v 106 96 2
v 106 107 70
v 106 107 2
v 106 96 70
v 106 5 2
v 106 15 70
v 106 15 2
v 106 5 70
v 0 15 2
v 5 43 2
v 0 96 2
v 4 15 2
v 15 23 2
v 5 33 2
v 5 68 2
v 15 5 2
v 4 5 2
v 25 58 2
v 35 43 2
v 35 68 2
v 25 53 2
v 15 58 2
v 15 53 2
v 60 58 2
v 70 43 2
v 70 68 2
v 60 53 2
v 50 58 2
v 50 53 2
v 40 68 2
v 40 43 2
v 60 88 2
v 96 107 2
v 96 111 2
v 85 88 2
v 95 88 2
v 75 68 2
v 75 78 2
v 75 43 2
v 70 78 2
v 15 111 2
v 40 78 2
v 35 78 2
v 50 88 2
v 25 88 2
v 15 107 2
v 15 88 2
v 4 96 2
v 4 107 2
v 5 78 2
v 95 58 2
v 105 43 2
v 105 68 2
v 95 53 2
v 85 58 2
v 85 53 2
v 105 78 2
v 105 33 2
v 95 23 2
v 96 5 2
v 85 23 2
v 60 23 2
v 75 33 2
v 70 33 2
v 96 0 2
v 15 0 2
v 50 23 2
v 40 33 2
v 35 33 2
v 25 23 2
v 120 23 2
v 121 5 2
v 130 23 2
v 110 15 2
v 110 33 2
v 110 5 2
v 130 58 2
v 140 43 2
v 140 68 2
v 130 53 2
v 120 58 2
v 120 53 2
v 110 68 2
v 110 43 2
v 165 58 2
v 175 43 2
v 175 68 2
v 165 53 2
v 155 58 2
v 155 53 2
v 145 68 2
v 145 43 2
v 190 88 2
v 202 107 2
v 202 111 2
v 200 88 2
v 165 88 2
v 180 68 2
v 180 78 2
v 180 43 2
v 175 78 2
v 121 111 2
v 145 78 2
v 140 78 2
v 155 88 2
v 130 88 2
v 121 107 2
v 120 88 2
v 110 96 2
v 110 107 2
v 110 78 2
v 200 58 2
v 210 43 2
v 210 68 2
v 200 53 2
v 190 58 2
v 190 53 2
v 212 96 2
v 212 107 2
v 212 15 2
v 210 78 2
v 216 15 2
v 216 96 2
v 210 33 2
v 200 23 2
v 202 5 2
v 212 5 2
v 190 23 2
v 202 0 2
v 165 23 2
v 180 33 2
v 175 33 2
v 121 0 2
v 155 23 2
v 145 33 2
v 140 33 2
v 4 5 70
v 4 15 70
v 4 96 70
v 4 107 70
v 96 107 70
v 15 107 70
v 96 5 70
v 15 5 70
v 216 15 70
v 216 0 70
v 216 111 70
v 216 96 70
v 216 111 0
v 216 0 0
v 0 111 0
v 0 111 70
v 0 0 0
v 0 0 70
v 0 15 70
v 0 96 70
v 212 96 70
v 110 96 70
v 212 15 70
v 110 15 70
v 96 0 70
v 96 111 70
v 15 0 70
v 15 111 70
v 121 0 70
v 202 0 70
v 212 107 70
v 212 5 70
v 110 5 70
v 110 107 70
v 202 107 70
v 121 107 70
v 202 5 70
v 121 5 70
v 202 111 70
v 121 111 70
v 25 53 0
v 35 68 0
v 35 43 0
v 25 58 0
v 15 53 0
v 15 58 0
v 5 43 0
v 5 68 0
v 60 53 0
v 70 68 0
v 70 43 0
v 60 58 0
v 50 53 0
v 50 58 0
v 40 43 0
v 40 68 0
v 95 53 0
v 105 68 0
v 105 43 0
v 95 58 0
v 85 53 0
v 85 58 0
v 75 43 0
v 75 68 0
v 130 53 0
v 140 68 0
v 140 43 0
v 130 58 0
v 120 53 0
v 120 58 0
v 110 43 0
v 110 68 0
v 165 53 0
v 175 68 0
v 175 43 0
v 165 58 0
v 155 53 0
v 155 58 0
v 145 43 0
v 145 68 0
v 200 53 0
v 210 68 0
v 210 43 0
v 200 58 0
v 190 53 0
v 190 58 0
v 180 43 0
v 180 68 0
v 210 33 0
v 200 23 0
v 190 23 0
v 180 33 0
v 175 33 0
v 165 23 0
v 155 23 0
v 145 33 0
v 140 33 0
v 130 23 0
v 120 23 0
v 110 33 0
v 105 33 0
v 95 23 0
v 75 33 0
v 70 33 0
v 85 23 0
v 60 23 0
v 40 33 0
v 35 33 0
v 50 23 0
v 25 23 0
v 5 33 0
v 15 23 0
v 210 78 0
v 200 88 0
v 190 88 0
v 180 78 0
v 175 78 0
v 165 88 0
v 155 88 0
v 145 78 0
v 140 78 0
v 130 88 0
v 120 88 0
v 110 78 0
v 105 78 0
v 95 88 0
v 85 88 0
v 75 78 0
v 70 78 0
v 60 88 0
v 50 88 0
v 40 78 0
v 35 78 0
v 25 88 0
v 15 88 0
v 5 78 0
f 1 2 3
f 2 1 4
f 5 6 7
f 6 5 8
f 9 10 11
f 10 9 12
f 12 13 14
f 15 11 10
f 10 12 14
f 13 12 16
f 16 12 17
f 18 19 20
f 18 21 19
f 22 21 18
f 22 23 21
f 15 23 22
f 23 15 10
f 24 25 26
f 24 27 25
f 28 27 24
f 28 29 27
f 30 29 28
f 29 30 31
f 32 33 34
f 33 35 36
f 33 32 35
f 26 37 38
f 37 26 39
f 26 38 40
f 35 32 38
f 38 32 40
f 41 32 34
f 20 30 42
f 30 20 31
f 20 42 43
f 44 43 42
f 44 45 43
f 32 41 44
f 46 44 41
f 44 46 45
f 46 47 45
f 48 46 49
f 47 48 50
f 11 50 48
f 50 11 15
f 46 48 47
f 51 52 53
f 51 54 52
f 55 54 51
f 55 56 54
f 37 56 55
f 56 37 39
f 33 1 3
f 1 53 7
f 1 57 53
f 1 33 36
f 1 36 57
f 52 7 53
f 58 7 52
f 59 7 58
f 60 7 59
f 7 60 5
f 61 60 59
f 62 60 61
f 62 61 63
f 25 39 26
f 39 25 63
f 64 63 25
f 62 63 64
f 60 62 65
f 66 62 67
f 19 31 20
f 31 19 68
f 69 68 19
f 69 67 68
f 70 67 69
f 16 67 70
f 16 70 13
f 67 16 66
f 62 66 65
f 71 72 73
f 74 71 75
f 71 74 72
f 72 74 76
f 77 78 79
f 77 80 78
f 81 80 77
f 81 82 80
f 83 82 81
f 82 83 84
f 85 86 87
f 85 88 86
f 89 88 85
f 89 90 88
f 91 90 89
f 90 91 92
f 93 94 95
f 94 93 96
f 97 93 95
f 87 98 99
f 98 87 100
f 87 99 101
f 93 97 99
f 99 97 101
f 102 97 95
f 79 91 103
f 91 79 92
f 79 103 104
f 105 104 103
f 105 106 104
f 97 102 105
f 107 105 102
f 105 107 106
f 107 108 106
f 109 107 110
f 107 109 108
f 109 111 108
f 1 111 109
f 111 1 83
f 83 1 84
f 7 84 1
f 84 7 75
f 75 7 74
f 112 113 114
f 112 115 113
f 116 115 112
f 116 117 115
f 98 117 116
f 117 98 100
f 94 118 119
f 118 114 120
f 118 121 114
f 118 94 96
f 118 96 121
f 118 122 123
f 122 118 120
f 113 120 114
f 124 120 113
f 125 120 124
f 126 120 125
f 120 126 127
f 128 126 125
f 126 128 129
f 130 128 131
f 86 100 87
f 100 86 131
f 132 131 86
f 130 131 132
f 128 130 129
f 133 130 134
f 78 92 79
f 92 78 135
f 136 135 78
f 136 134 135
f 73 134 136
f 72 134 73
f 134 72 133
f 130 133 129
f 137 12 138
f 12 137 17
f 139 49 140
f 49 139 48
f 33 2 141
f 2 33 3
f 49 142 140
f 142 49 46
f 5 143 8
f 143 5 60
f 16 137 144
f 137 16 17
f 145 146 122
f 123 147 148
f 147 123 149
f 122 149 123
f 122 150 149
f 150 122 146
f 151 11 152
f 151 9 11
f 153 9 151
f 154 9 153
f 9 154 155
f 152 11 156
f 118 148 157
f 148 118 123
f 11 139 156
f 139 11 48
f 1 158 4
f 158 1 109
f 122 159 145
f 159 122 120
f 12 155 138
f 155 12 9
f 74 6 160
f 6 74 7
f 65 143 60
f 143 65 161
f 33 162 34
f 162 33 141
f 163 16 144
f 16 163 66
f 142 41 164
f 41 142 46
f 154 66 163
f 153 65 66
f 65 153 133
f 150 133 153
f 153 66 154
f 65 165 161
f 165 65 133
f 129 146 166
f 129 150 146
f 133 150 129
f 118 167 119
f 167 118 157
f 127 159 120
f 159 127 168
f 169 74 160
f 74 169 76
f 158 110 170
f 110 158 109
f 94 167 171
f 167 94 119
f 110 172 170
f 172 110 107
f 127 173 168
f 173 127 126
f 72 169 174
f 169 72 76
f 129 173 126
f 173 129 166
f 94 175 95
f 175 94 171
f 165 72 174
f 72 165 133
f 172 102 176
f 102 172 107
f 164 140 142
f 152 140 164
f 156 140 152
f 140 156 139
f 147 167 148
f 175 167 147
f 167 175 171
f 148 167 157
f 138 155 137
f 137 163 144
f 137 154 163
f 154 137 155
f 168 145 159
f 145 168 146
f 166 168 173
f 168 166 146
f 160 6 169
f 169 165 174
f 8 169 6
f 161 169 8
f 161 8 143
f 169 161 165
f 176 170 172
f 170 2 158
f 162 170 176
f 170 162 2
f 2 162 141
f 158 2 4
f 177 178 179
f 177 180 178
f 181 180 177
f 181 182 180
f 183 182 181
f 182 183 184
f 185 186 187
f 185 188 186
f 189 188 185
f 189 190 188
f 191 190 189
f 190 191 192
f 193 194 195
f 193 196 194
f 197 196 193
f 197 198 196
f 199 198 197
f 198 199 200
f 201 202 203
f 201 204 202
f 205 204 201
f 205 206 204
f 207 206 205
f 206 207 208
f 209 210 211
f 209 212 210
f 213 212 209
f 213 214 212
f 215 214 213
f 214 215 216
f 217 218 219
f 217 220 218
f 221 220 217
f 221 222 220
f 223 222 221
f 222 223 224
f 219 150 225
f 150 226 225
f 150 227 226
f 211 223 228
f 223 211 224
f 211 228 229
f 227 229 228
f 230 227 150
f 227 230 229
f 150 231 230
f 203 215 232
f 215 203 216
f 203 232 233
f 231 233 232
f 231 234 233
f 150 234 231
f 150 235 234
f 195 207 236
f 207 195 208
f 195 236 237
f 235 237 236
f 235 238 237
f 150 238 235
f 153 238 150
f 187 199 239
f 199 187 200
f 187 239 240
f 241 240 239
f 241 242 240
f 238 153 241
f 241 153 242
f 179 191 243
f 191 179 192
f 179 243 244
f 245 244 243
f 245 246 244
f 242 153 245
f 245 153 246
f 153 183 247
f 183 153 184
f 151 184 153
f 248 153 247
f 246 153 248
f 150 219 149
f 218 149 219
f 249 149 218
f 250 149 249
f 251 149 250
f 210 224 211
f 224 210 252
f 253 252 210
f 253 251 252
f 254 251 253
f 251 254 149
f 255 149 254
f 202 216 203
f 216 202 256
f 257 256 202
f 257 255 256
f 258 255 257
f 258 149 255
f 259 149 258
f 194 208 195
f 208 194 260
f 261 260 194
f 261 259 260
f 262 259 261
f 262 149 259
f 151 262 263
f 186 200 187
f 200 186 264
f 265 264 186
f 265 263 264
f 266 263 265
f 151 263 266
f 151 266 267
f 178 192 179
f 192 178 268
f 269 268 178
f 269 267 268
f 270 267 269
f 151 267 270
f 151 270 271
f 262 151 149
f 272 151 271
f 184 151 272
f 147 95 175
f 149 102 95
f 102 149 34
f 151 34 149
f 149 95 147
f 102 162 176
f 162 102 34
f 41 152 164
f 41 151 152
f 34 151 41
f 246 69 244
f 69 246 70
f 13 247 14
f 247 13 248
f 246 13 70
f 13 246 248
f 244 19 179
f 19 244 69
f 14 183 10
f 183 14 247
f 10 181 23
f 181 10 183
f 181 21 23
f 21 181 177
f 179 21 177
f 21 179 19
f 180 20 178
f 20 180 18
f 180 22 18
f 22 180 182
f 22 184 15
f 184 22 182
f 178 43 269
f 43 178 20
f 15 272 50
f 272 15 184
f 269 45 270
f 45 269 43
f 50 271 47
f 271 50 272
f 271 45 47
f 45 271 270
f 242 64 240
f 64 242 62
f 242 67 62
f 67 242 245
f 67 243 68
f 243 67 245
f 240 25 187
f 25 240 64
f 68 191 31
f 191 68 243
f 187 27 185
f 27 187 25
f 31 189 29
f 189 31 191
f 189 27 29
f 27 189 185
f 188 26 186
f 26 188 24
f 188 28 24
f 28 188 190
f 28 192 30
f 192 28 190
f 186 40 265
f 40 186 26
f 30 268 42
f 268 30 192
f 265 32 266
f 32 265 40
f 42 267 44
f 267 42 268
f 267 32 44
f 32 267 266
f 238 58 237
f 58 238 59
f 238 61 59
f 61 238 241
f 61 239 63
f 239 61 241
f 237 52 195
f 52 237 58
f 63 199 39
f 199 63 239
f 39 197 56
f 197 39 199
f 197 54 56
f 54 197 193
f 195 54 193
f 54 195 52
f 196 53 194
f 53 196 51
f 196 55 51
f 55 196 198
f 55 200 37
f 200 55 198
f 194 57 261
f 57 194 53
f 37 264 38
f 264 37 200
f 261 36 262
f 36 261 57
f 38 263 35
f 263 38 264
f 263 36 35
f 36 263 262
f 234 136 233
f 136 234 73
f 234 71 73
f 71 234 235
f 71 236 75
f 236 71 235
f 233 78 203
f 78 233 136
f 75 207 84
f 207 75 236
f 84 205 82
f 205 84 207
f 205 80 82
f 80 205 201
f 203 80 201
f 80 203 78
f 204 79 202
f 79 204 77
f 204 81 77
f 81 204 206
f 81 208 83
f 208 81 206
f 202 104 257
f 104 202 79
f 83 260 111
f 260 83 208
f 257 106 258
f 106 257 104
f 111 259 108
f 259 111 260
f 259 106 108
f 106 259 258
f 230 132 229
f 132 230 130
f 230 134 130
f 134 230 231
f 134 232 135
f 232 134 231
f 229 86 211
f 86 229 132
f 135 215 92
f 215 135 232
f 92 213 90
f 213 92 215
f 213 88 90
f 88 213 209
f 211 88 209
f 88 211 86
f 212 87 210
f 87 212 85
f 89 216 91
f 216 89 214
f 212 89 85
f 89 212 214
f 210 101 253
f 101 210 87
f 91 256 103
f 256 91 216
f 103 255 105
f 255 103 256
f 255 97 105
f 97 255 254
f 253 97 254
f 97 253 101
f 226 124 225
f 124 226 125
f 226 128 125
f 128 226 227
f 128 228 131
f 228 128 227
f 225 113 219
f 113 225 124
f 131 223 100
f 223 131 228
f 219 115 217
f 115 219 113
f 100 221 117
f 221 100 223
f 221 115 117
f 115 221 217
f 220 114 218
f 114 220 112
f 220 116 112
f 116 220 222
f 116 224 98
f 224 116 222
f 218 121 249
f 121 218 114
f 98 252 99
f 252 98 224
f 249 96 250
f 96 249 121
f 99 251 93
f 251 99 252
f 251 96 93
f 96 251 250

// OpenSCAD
/*difference () {
cube([216,216,35]);
    for ( x = [5,111])
        for ( y = [5,111]) {
            translate([x,y,1])
                cube([101,101,99]);
            translate([0,y+10,1])
                cube([216,81,99]);
            translate([x+10,0,1])
                cube([81,216,99]);
        }
}*/
difference (){
    difference () {
    cube([216,111,70]);
        for ( x = [5,111])
            for ( y = [5]) {
                translate([x-1,y,2])
                    cube([102,102,70]);
                translate([0,y+10,2])
                    cube([216,81,70]);
                translate([x+10,0,2])
                    cube([81,216,70]);
            }
    }
    for ( x1 = [5,40,75,110,145,180])
        for ( y1 = [13,48]) {
            translate([x1,y1,0])
            linear_extrude(height = 2)
            polygon([[10,10],[20,10],[30,20],[20,20],[0,20]]);
            translate([x1,y1+10,0])
            linear_extrude(height = 2)
            polygon([[0,10],[30,10],[30,20],[10,20],[0,20]]);
            translate([x1,y1+10,0])
            linear_extrude(height = 2)
            polygon([[0,20],[10,30],[20,30],[30,20]]);
        }
}
